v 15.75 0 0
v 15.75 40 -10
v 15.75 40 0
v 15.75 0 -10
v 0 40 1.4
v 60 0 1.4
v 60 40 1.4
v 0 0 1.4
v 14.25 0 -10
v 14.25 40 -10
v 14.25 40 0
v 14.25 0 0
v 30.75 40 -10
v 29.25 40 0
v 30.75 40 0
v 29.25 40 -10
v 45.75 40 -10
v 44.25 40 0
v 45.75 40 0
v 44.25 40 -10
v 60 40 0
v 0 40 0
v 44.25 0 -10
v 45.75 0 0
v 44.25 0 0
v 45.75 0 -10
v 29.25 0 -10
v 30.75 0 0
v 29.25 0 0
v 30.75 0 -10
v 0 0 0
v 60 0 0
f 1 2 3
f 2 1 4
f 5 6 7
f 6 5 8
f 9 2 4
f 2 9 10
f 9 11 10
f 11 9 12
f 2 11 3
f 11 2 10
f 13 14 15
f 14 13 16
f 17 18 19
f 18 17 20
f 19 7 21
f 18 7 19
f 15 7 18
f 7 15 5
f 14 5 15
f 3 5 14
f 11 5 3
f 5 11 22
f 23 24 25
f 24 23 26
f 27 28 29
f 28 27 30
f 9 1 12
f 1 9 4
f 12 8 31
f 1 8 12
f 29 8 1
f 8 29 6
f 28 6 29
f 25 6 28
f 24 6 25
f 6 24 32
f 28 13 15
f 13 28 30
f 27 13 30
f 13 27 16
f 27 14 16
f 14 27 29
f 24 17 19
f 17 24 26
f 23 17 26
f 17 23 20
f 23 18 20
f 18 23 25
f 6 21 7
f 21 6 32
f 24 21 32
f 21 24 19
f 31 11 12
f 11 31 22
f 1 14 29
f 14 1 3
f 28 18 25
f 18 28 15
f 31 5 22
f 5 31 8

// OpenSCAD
$fn = 32;

// ----------------------------------------------------------------------
// Ribbed panel: 1.4 mm panel
// ----------------------------------------------------------------------

// --- parameters (mm) ---
panel_l = 60;             // panel length, X
panel_w = 40;             // panel width, Y
panel_t = 1.4;            // panel thickness, Z
rib_t = 1.5;              // rib thickness
rib_h = 10;               // rib height below the panel
ribs = 3;                 // number of ribs

total_h = panel_t + rib_h;  // overall height

union() {
  cube([panel_l, panel_w, panel_t]);
  for (i = [1 : ribs])
    translate([i * panel_l / (ribs + 1) - rib_t / 2, 0, -rib_h])
      cube([rib_t, panel_w, rib_h + panel_t]);
}
